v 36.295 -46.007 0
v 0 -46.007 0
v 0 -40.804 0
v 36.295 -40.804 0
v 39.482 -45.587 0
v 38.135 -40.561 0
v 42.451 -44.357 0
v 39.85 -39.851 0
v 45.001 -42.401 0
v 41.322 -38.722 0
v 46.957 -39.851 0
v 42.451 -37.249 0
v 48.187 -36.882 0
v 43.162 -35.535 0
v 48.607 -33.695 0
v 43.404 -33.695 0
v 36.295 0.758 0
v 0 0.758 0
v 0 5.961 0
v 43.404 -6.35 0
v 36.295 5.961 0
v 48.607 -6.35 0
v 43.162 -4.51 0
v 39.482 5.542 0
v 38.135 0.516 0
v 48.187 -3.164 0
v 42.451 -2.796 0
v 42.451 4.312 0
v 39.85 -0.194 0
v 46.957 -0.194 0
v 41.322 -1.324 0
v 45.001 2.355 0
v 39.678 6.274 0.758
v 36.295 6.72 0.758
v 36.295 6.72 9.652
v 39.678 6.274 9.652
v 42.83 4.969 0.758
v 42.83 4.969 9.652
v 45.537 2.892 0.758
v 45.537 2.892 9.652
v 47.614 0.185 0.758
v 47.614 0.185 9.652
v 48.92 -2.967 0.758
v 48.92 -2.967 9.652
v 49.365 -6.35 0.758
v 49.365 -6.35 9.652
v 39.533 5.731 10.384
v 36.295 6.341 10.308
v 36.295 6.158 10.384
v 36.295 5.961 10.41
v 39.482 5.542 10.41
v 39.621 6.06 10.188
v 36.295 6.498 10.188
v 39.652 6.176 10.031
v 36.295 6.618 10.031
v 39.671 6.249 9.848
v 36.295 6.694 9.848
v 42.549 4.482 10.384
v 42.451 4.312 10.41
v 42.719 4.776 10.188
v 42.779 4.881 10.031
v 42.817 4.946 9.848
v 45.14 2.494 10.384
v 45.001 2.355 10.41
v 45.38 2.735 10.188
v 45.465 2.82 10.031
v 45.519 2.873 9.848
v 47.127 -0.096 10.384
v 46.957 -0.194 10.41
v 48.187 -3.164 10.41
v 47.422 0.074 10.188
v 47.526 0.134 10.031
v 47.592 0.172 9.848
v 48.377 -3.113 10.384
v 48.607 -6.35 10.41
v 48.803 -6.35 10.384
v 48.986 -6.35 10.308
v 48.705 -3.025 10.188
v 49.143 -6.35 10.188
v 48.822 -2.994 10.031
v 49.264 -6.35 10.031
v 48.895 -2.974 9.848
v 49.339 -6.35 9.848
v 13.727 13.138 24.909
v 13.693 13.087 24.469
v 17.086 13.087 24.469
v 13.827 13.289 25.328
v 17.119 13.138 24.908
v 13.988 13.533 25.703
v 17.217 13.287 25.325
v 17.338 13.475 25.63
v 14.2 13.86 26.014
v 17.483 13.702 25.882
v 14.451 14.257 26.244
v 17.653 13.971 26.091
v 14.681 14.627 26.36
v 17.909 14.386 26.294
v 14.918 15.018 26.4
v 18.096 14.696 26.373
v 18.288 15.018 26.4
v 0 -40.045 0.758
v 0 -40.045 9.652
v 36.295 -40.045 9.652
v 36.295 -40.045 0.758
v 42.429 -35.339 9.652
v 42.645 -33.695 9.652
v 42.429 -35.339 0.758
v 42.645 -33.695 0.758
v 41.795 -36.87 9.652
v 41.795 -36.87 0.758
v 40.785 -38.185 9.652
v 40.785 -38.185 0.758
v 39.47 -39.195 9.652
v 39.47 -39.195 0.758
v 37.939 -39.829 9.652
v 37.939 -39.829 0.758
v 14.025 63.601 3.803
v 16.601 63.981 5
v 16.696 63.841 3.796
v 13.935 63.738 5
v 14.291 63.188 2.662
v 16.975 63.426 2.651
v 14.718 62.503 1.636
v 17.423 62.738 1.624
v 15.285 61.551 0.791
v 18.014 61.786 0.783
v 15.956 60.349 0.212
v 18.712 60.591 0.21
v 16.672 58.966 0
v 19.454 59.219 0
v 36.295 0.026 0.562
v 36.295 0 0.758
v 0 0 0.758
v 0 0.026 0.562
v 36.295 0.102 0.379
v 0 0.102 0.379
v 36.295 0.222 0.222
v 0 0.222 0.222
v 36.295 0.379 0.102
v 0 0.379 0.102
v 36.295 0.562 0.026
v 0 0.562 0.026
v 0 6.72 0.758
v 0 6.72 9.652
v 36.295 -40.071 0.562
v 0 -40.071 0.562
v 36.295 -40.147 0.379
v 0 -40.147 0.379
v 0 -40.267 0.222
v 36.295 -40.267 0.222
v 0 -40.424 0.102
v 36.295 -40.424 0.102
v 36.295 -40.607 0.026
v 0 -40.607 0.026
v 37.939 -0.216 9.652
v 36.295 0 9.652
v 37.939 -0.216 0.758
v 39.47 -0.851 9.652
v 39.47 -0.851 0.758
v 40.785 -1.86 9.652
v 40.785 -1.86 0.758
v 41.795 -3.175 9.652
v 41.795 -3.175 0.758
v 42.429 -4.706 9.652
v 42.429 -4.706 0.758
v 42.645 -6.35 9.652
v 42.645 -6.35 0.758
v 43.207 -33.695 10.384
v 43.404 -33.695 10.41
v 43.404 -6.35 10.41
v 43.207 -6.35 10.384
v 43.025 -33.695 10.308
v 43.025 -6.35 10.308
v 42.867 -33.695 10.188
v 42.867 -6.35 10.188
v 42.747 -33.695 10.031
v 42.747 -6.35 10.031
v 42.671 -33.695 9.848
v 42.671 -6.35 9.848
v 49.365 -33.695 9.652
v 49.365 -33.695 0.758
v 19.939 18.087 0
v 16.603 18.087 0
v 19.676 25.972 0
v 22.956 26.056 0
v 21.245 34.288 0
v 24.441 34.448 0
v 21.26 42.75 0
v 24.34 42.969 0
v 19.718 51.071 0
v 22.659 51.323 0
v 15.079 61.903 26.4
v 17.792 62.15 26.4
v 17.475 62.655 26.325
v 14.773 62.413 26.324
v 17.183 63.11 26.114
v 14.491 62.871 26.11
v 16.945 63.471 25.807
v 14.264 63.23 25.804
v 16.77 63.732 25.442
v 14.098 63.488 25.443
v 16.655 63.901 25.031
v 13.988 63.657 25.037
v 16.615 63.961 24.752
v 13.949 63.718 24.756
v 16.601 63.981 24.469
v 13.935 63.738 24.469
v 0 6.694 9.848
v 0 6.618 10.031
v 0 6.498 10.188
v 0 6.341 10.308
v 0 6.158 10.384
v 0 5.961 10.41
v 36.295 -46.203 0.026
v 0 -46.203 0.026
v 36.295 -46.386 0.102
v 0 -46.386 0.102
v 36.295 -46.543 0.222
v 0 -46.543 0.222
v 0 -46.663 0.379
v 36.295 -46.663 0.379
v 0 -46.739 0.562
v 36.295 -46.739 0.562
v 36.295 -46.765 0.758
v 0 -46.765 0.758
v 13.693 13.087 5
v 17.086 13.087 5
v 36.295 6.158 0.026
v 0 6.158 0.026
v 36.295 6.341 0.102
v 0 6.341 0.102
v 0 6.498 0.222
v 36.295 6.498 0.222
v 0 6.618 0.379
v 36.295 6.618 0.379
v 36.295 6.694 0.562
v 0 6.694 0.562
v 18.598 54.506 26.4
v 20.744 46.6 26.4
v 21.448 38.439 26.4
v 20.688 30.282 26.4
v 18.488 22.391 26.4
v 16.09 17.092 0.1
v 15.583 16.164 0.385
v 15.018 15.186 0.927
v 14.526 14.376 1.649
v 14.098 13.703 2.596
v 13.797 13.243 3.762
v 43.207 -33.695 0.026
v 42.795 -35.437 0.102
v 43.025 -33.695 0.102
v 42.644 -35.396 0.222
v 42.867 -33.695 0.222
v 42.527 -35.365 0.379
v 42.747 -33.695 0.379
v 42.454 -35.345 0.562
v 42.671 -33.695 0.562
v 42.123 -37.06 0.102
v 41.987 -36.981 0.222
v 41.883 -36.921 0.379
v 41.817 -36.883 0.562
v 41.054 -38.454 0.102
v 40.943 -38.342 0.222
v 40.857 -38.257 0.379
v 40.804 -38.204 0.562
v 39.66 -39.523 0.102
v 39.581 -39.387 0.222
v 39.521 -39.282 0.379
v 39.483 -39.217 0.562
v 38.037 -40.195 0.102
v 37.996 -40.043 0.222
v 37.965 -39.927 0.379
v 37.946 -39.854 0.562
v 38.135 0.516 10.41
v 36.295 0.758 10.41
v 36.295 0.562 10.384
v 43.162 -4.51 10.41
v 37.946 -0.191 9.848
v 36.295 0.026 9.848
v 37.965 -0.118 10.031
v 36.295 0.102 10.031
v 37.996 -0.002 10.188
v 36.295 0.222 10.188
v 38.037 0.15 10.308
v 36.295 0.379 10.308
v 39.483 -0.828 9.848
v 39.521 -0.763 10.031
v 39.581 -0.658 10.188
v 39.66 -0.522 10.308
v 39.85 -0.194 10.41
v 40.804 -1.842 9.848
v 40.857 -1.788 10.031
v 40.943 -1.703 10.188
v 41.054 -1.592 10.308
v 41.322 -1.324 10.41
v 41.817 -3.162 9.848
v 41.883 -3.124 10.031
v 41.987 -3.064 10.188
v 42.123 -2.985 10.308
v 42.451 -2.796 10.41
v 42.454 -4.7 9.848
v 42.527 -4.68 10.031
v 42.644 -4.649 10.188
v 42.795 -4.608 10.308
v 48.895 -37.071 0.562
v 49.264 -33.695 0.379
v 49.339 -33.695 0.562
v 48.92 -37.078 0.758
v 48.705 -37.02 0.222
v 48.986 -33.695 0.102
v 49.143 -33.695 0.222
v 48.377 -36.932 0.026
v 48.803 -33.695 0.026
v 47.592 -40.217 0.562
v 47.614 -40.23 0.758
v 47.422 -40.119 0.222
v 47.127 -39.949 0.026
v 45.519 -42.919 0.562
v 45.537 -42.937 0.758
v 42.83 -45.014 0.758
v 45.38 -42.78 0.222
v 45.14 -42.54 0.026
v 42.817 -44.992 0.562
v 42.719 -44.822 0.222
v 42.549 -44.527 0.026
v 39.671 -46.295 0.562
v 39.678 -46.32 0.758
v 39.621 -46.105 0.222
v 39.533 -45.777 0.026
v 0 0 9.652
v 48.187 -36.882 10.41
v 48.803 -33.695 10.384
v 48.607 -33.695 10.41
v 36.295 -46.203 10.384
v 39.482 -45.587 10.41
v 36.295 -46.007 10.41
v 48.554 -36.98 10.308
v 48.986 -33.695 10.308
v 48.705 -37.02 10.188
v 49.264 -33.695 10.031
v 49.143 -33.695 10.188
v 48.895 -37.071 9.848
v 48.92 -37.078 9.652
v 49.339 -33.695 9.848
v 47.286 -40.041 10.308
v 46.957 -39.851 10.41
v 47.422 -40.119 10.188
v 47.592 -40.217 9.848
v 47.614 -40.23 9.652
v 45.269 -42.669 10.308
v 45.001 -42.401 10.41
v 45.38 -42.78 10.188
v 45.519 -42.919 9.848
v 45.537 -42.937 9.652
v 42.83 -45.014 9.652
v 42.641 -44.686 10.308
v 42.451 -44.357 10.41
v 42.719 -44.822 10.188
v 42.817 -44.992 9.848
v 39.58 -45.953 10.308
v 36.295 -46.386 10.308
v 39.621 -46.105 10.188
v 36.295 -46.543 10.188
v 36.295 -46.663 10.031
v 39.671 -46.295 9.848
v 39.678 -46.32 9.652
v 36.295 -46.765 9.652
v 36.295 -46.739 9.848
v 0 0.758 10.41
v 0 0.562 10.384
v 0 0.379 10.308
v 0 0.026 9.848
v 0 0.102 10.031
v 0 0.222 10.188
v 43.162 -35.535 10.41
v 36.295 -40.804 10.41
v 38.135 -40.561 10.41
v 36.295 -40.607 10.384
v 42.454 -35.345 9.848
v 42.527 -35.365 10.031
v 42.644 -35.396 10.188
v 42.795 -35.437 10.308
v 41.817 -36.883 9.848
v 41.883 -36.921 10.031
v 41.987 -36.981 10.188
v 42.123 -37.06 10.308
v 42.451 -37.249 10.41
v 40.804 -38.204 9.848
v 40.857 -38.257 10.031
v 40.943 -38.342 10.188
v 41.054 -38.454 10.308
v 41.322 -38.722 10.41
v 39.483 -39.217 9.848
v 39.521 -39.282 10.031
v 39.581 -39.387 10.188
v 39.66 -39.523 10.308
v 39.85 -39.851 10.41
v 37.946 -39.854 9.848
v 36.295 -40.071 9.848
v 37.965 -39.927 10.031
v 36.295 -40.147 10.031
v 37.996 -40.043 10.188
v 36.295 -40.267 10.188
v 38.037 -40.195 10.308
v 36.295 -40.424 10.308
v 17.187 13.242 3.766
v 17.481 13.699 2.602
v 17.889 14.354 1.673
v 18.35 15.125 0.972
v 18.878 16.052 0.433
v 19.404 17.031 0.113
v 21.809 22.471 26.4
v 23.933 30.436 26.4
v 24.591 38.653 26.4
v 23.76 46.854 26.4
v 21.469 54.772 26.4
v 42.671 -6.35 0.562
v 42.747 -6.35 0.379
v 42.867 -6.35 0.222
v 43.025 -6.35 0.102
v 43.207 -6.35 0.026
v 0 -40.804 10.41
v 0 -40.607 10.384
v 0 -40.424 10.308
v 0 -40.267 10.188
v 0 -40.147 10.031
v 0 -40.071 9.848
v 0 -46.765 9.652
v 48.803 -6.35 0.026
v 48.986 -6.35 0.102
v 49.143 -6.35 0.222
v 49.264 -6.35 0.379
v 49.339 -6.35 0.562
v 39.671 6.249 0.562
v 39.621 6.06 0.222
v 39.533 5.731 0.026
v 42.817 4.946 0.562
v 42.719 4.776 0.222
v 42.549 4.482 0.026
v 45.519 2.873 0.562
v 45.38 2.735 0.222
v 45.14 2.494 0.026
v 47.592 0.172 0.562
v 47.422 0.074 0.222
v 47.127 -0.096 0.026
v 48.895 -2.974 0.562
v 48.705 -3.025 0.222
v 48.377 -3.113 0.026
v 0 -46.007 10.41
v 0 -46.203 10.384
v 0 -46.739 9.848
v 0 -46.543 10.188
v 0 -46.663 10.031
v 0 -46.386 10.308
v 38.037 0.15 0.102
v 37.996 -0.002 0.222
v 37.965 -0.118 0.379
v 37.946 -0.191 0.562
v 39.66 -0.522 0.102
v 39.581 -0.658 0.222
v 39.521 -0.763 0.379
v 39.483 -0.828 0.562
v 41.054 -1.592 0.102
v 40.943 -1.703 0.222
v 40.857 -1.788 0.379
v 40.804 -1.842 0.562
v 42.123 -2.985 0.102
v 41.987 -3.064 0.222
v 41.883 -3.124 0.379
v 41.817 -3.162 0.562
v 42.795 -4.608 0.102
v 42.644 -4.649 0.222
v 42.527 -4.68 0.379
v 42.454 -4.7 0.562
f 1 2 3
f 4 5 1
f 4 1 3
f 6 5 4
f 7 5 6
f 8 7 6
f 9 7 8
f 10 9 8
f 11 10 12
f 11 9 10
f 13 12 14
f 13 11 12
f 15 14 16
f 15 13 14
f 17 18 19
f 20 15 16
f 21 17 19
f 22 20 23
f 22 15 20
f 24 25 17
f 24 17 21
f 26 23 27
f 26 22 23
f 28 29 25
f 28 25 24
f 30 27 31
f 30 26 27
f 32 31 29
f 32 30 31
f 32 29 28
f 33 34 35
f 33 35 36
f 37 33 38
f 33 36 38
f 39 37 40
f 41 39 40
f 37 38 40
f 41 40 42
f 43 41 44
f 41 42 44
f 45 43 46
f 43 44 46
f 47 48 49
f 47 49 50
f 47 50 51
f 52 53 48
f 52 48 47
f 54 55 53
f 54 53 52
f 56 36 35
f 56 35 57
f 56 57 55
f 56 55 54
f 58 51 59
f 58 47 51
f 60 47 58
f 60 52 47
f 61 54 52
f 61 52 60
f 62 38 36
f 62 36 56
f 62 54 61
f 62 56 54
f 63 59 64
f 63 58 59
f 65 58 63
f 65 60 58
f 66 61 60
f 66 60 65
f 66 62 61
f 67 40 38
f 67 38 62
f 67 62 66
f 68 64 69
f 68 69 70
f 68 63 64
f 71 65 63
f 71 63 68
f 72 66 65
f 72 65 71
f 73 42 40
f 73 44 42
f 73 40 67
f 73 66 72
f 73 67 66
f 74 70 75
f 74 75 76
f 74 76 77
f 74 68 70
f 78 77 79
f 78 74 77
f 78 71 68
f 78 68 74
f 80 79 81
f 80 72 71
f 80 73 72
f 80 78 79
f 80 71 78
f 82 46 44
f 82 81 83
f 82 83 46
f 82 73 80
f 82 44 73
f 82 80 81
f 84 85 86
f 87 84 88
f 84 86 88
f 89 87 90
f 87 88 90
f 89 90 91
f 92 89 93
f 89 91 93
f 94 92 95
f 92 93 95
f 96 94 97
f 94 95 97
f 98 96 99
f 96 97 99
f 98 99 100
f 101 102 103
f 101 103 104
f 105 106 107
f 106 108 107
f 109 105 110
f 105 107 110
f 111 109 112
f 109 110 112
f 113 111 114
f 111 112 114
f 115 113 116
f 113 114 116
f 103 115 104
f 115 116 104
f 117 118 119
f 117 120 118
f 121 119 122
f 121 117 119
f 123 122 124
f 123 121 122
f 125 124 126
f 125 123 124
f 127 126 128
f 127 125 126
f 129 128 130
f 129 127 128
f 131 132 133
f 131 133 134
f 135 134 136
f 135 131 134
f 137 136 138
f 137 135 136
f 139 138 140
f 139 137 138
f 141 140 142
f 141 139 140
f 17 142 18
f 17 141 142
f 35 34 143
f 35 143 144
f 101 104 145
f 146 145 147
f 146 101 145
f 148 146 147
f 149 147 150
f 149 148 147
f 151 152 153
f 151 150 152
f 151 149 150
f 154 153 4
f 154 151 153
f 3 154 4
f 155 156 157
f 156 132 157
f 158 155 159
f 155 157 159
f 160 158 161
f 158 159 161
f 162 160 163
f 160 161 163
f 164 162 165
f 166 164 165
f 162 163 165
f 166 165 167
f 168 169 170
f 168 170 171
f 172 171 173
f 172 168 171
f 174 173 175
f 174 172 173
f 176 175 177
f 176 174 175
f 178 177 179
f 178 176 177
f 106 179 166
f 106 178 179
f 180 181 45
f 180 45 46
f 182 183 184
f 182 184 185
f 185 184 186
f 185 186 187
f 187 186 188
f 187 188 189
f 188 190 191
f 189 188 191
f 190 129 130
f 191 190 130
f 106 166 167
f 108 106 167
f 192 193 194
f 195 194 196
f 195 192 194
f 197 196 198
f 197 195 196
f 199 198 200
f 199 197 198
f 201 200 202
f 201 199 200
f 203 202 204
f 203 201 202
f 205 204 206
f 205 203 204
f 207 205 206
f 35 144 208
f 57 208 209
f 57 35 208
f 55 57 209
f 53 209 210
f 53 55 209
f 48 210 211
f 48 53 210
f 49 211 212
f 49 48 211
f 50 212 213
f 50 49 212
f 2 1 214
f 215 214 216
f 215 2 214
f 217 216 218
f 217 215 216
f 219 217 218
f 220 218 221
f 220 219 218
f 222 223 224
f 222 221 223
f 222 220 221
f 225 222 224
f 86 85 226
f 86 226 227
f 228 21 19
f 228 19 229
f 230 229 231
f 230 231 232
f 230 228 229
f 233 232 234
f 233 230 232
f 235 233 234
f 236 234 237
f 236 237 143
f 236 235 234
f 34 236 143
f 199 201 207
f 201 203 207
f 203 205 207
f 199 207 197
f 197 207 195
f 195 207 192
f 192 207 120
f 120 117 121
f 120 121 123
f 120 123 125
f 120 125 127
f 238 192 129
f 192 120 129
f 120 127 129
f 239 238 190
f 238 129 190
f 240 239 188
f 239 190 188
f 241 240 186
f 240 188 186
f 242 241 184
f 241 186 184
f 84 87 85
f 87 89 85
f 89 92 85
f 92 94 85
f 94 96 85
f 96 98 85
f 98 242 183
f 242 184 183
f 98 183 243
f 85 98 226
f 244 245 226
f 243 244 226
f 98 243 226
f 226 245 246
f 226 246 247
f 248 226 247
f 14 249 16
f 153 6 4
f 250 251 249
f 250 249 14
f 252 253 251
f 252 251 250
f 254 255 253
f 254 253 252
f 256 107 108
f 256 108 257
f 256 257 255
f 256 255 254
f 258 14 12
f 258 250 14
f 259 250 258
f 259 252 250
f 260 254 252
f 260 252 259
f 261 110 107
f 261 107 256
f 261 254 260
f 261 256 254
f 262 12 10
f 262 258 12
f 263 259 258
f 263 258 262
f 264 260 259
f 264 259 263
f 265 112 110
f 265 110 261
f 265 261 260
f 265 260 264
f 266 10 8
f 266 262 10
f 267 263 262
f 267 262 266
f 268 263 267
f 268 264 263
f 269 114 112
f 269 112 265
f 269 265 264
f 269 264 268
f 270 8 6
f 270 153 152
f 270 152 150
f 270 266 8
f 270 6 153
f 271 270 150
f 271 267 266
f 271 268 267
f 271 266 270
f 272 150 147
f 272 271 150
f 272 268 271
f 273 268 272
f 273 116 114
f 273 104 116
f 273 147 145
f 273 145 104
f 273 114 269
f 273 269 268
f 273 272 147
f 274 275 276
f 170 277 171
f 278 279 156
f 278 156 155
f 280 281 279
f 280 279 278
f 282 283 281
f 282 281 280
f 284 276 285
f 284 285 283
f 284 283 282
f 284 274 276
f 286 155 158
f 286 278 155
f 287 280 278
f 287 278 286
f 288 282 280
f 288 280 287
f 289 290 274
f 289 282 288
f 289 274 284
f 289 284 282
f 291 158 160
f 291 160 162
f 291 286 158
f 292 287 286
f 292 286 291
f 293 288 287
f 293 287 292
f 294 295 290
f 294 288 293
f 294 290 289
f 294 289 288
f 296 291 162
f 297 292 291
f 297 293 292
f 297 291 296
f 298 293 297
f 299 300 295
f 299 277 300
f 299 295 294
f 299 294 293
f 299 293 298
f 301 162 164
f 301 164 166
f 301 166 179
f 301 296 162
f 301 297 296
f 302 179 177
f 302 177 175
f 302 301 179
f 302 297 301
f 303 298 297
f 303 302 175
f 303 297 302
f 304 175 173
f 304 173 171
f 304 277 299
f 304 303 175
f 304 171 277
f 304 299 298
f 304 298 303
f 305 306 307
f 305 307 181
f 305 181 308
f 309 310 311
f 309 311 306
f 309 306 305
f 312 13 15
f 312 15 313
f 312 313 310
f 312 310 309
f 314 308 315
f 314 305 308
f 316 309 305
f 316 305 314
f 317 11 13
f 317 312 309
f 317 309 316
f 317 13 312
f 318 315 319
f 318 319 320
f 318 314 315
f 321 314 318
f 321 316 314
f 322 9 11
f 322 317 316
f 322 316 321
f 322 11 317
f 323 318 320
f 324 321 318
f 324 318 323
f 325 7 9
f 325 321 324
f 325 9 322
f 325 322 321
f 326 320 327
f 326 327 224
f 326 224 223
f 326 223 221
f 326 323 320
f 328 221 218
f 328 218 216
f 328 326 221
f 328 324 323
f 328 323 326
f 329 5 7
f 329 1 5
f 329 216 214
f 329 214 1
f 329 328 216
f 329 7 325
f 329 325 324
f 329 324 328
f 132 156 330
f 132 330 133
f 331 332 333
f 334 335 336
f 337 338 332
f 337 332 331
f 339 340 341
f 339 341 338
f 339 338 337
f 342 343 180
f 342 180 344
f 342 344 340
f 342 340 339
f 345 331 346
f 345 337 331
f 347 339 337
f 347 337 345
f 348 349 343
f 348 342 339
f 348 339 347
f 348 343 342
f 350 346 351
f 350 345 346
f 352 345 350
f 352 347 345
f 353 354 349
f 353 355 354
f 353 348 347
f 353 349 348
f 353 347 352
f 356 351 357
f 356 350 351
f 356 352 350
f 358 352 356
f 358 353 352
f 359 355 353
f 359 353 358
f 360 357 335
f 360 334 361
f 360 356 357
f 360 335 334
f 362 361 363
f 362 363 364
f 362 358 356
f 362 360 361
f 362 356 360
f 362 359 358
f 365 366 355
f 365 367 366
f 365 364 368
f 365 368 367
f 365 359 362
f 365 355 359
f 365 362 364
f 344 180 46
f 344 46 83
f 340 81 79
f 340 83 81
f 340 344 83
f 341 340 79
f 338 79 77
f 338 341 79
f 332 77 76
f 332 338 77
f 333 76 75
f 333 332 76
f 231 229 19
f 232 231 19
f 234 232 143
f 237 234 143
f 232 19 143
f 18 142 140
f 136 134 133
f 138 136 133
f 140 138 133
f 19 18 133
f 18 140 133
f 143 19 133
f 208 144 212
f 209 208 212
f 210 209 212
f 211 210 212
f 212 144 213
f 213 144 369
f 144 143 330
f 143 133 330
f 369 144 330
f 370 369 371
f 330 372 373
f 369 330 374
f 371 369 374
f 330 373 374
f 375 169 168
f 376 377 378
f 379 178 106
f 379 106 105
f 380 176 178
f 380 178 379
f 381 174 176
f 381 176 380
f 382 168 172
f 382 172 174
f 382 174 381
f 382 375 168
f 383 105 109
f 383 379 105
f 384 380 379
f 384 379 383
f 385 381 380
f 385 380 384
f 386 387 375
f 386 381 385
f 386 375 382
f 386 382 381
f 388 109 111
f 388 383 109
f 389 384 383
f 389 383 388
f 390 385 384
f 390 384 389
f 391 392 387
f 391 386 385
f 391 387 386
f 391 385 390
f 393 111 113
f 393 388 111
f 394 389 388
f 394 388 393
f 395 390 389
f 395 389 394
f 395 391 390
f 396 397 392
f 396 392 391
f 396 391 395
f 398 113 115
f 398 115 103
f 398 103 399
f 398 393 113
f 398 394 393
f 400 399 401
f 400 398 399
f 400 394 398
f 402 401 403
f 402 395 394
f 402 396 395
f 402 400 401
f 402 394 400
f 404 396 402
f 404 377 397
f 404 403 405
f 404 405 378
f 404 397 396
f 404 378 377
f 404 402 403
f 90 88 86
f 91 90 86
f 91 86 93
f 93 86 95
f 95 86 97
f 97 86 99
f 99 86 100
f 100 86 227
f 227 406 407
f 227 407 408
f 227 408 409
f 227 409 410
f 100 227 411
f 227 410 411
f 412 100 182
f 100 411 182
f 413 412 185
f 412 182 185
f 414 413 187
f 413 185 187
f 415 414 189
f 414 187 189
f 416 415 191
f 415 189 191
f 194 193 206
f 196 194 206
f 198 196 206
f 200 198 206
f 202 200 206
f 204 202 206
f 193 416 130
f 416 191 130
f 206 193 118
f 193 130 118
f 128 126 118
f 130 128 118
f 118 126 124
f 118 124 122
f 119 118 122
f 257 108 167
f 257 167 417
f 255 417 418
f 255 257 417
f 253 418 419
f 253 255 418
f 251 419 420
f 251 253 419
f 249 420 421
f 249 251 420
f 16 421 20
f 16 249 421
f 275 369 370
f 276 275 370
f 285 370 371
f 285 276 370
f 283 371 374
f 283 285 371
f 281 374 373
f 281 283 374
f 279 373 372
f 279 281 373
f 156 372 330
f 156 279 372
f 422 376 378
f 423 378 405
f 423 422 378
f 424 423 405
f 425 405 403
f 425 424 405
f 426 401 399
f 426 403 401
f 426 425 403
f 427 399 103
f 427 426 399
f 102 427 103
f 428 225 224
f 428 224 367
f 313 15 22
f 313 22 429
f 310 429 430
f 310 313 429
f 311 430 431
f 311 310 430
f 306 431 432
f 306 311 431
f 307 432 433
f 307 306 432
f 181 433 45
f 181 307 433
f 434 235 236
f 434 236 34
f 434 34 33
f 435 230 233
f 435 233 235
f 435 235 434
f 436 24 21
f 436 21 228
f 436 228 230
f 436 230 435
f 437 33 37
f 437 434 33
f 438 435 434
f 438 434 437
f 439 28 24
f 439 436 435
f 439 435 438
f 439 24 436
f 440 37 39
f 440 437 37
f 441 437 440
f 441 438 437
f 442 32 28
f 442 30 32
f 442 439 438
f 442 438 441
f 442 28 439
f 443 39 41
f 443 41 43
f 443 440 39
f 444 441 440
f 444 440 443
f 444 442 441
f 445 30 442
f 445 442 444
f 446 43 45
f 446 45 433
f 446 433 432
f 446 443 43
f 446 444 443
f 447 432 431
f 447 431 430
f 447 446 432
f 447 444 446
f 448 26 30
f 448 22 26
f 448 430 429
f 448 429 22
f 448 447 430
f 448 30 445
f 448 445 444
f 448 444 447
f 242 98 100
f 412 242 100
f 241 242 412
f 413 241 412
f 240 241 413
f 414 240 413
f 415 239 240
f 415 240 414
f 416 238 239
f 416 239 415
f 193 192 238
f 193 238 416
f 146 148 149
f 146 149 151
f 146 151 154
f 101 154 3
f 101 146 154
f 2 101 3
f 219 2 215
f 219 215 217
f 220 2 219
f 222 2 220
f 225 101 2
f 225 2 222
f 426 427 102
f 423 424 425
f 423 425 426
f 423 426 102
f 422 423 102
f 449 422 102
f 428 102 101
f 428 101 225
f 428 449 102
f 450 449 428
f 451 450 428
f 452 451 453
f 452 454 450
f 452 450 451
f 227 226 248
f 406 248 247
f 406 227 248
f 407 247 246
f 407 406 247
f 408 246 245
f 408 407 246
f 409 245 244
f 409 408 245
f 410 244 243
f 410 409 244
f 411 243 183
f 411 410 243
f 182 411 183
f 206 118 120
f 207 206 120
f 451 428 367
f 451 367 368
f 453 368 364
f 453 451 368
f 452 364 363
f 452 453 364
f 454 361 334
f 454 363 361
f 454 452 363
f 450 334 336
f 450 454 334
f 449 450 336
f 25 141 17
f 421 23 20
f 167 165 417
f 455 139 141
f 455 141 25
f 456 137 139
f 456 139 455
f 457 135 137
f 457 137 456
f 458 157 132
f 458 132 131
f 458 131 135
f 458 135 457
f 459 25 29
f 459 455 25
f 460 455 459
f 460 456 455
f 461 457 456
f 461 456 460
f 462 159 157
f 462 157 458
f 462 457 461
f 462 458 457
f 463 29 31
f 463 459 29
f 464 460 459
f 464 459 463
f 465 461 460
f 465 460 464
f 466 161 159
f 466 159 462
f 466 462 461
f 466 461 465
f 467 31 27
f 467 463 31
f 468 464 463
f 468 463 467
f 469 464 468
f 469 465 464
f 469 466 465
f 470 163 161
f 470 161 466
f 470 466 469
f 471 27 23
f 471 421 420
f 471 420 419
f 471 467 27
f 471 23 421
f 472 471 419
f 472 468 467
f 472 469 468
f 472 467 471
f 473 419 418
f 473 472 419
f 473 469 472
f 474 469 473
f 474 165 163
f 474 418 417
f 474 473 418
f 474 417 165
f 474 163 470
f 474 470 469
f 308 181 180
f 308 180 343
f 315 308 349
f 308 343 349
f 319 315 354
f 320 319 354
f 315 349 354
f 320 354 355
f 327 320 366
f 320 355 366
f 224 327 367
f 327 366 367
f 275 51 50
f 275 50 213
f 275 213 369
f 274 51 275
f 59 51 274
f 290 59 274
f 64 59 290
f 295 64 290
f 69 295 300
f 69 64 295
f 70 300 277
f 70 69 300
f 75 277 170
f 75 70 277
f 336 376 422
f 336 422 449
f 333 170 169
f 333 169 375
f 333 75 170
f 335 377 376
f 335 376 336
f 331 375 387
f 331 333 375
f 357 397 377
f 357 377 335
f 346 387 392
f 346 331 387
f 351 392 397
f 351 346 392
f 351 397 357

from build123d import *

# Parameters (mm, degrees)
F4_DEPTH = 26.4
F5_R     = 5
F6_R     = 1.931371


with BuildPart() as f2:
    # F2: sweep along a path in F0
    with BuildLine(Plane.XY) as f2_path:
        Line((0, 0), (36.295343, 0))
        ThreePointArc((36.295343, 0), (40.785471, -1.859872), (42.645343, -6.35))
        Line((42.645343, -6.35), (42.645343, -33.695246))
        ThreePointArc((42.645343, -33.695246), (40.785471, -38.185375), (36.295343, -40.045246))
        Line((36.295343, -40.045246), (0, -40.045246))
    # F1 (on Right) → F2 (sweep)
    with BuildSketch(Plane.YZ):
        with BuildLine():
            ThreePointArc((0, 0.758383), (0.222125, 0.222125), (0.758383, 0))
            Line((0.758383, 0), (5.961396, 0))
            ThreePointArc((5.961396, 0), (6.497654, 0.222125), (6.719779, 0.758383))
            Line((6.719779, 0.758383), (6.719779, 9.651675))
            ThreePointArc((6.719779, 9.651675), (6.497654, 10.187932), (5.961396, 10.410057))
            Line((5.961396, 10.410057), (0.758383, 10.410057))
            ThreePointArc((0.758383, 10.410057), (0.222125, 10.187932), (0, 9.651675))
            Line((0, 9.651675), (0, 0.758383))
        make_face()
    sweep(path=f2_path.line)


with BuildPart() as f4:
    # F3 (on Top) → F4 (new body)
    with BuildSketch(Plane.XY):
        with BuildLine():
            Line((13.692821, 13.086937), (17.085731, 13.086937))
            ThreePointArc((17.085731, 13.086937), (24.591012, 38.607545), (16.60103, 63.980579))
            Line((16.60103, 63.980579), (13.935172, 63.738227))
            ThreePointArc((13.935172, 63.738227), (21.447874, 38.376056), (13.692821, 13.086937))
        make_face()
    extrude(amount=F4_DEPTH)

    # F5
    f5_edges = [f4.edges().sort_by_distance(p)[0] for p in [
        (15.268101, 63.859403, 0),
        (15.389276, 13.086937, 0),
    ]]
    fillet(f5_edges, radius=F5_R)

    # F6
    f6_edges = [f4.edges().sort_by_distance(p)[0] for p in [
        (15.268101, 63.859403, 26.4),
        (15.389276, 13.086937, 26.4),
    ]]
    fillet(f6_edges, radius=F6_R)


solid = Compound([f2.part, f4.part])
